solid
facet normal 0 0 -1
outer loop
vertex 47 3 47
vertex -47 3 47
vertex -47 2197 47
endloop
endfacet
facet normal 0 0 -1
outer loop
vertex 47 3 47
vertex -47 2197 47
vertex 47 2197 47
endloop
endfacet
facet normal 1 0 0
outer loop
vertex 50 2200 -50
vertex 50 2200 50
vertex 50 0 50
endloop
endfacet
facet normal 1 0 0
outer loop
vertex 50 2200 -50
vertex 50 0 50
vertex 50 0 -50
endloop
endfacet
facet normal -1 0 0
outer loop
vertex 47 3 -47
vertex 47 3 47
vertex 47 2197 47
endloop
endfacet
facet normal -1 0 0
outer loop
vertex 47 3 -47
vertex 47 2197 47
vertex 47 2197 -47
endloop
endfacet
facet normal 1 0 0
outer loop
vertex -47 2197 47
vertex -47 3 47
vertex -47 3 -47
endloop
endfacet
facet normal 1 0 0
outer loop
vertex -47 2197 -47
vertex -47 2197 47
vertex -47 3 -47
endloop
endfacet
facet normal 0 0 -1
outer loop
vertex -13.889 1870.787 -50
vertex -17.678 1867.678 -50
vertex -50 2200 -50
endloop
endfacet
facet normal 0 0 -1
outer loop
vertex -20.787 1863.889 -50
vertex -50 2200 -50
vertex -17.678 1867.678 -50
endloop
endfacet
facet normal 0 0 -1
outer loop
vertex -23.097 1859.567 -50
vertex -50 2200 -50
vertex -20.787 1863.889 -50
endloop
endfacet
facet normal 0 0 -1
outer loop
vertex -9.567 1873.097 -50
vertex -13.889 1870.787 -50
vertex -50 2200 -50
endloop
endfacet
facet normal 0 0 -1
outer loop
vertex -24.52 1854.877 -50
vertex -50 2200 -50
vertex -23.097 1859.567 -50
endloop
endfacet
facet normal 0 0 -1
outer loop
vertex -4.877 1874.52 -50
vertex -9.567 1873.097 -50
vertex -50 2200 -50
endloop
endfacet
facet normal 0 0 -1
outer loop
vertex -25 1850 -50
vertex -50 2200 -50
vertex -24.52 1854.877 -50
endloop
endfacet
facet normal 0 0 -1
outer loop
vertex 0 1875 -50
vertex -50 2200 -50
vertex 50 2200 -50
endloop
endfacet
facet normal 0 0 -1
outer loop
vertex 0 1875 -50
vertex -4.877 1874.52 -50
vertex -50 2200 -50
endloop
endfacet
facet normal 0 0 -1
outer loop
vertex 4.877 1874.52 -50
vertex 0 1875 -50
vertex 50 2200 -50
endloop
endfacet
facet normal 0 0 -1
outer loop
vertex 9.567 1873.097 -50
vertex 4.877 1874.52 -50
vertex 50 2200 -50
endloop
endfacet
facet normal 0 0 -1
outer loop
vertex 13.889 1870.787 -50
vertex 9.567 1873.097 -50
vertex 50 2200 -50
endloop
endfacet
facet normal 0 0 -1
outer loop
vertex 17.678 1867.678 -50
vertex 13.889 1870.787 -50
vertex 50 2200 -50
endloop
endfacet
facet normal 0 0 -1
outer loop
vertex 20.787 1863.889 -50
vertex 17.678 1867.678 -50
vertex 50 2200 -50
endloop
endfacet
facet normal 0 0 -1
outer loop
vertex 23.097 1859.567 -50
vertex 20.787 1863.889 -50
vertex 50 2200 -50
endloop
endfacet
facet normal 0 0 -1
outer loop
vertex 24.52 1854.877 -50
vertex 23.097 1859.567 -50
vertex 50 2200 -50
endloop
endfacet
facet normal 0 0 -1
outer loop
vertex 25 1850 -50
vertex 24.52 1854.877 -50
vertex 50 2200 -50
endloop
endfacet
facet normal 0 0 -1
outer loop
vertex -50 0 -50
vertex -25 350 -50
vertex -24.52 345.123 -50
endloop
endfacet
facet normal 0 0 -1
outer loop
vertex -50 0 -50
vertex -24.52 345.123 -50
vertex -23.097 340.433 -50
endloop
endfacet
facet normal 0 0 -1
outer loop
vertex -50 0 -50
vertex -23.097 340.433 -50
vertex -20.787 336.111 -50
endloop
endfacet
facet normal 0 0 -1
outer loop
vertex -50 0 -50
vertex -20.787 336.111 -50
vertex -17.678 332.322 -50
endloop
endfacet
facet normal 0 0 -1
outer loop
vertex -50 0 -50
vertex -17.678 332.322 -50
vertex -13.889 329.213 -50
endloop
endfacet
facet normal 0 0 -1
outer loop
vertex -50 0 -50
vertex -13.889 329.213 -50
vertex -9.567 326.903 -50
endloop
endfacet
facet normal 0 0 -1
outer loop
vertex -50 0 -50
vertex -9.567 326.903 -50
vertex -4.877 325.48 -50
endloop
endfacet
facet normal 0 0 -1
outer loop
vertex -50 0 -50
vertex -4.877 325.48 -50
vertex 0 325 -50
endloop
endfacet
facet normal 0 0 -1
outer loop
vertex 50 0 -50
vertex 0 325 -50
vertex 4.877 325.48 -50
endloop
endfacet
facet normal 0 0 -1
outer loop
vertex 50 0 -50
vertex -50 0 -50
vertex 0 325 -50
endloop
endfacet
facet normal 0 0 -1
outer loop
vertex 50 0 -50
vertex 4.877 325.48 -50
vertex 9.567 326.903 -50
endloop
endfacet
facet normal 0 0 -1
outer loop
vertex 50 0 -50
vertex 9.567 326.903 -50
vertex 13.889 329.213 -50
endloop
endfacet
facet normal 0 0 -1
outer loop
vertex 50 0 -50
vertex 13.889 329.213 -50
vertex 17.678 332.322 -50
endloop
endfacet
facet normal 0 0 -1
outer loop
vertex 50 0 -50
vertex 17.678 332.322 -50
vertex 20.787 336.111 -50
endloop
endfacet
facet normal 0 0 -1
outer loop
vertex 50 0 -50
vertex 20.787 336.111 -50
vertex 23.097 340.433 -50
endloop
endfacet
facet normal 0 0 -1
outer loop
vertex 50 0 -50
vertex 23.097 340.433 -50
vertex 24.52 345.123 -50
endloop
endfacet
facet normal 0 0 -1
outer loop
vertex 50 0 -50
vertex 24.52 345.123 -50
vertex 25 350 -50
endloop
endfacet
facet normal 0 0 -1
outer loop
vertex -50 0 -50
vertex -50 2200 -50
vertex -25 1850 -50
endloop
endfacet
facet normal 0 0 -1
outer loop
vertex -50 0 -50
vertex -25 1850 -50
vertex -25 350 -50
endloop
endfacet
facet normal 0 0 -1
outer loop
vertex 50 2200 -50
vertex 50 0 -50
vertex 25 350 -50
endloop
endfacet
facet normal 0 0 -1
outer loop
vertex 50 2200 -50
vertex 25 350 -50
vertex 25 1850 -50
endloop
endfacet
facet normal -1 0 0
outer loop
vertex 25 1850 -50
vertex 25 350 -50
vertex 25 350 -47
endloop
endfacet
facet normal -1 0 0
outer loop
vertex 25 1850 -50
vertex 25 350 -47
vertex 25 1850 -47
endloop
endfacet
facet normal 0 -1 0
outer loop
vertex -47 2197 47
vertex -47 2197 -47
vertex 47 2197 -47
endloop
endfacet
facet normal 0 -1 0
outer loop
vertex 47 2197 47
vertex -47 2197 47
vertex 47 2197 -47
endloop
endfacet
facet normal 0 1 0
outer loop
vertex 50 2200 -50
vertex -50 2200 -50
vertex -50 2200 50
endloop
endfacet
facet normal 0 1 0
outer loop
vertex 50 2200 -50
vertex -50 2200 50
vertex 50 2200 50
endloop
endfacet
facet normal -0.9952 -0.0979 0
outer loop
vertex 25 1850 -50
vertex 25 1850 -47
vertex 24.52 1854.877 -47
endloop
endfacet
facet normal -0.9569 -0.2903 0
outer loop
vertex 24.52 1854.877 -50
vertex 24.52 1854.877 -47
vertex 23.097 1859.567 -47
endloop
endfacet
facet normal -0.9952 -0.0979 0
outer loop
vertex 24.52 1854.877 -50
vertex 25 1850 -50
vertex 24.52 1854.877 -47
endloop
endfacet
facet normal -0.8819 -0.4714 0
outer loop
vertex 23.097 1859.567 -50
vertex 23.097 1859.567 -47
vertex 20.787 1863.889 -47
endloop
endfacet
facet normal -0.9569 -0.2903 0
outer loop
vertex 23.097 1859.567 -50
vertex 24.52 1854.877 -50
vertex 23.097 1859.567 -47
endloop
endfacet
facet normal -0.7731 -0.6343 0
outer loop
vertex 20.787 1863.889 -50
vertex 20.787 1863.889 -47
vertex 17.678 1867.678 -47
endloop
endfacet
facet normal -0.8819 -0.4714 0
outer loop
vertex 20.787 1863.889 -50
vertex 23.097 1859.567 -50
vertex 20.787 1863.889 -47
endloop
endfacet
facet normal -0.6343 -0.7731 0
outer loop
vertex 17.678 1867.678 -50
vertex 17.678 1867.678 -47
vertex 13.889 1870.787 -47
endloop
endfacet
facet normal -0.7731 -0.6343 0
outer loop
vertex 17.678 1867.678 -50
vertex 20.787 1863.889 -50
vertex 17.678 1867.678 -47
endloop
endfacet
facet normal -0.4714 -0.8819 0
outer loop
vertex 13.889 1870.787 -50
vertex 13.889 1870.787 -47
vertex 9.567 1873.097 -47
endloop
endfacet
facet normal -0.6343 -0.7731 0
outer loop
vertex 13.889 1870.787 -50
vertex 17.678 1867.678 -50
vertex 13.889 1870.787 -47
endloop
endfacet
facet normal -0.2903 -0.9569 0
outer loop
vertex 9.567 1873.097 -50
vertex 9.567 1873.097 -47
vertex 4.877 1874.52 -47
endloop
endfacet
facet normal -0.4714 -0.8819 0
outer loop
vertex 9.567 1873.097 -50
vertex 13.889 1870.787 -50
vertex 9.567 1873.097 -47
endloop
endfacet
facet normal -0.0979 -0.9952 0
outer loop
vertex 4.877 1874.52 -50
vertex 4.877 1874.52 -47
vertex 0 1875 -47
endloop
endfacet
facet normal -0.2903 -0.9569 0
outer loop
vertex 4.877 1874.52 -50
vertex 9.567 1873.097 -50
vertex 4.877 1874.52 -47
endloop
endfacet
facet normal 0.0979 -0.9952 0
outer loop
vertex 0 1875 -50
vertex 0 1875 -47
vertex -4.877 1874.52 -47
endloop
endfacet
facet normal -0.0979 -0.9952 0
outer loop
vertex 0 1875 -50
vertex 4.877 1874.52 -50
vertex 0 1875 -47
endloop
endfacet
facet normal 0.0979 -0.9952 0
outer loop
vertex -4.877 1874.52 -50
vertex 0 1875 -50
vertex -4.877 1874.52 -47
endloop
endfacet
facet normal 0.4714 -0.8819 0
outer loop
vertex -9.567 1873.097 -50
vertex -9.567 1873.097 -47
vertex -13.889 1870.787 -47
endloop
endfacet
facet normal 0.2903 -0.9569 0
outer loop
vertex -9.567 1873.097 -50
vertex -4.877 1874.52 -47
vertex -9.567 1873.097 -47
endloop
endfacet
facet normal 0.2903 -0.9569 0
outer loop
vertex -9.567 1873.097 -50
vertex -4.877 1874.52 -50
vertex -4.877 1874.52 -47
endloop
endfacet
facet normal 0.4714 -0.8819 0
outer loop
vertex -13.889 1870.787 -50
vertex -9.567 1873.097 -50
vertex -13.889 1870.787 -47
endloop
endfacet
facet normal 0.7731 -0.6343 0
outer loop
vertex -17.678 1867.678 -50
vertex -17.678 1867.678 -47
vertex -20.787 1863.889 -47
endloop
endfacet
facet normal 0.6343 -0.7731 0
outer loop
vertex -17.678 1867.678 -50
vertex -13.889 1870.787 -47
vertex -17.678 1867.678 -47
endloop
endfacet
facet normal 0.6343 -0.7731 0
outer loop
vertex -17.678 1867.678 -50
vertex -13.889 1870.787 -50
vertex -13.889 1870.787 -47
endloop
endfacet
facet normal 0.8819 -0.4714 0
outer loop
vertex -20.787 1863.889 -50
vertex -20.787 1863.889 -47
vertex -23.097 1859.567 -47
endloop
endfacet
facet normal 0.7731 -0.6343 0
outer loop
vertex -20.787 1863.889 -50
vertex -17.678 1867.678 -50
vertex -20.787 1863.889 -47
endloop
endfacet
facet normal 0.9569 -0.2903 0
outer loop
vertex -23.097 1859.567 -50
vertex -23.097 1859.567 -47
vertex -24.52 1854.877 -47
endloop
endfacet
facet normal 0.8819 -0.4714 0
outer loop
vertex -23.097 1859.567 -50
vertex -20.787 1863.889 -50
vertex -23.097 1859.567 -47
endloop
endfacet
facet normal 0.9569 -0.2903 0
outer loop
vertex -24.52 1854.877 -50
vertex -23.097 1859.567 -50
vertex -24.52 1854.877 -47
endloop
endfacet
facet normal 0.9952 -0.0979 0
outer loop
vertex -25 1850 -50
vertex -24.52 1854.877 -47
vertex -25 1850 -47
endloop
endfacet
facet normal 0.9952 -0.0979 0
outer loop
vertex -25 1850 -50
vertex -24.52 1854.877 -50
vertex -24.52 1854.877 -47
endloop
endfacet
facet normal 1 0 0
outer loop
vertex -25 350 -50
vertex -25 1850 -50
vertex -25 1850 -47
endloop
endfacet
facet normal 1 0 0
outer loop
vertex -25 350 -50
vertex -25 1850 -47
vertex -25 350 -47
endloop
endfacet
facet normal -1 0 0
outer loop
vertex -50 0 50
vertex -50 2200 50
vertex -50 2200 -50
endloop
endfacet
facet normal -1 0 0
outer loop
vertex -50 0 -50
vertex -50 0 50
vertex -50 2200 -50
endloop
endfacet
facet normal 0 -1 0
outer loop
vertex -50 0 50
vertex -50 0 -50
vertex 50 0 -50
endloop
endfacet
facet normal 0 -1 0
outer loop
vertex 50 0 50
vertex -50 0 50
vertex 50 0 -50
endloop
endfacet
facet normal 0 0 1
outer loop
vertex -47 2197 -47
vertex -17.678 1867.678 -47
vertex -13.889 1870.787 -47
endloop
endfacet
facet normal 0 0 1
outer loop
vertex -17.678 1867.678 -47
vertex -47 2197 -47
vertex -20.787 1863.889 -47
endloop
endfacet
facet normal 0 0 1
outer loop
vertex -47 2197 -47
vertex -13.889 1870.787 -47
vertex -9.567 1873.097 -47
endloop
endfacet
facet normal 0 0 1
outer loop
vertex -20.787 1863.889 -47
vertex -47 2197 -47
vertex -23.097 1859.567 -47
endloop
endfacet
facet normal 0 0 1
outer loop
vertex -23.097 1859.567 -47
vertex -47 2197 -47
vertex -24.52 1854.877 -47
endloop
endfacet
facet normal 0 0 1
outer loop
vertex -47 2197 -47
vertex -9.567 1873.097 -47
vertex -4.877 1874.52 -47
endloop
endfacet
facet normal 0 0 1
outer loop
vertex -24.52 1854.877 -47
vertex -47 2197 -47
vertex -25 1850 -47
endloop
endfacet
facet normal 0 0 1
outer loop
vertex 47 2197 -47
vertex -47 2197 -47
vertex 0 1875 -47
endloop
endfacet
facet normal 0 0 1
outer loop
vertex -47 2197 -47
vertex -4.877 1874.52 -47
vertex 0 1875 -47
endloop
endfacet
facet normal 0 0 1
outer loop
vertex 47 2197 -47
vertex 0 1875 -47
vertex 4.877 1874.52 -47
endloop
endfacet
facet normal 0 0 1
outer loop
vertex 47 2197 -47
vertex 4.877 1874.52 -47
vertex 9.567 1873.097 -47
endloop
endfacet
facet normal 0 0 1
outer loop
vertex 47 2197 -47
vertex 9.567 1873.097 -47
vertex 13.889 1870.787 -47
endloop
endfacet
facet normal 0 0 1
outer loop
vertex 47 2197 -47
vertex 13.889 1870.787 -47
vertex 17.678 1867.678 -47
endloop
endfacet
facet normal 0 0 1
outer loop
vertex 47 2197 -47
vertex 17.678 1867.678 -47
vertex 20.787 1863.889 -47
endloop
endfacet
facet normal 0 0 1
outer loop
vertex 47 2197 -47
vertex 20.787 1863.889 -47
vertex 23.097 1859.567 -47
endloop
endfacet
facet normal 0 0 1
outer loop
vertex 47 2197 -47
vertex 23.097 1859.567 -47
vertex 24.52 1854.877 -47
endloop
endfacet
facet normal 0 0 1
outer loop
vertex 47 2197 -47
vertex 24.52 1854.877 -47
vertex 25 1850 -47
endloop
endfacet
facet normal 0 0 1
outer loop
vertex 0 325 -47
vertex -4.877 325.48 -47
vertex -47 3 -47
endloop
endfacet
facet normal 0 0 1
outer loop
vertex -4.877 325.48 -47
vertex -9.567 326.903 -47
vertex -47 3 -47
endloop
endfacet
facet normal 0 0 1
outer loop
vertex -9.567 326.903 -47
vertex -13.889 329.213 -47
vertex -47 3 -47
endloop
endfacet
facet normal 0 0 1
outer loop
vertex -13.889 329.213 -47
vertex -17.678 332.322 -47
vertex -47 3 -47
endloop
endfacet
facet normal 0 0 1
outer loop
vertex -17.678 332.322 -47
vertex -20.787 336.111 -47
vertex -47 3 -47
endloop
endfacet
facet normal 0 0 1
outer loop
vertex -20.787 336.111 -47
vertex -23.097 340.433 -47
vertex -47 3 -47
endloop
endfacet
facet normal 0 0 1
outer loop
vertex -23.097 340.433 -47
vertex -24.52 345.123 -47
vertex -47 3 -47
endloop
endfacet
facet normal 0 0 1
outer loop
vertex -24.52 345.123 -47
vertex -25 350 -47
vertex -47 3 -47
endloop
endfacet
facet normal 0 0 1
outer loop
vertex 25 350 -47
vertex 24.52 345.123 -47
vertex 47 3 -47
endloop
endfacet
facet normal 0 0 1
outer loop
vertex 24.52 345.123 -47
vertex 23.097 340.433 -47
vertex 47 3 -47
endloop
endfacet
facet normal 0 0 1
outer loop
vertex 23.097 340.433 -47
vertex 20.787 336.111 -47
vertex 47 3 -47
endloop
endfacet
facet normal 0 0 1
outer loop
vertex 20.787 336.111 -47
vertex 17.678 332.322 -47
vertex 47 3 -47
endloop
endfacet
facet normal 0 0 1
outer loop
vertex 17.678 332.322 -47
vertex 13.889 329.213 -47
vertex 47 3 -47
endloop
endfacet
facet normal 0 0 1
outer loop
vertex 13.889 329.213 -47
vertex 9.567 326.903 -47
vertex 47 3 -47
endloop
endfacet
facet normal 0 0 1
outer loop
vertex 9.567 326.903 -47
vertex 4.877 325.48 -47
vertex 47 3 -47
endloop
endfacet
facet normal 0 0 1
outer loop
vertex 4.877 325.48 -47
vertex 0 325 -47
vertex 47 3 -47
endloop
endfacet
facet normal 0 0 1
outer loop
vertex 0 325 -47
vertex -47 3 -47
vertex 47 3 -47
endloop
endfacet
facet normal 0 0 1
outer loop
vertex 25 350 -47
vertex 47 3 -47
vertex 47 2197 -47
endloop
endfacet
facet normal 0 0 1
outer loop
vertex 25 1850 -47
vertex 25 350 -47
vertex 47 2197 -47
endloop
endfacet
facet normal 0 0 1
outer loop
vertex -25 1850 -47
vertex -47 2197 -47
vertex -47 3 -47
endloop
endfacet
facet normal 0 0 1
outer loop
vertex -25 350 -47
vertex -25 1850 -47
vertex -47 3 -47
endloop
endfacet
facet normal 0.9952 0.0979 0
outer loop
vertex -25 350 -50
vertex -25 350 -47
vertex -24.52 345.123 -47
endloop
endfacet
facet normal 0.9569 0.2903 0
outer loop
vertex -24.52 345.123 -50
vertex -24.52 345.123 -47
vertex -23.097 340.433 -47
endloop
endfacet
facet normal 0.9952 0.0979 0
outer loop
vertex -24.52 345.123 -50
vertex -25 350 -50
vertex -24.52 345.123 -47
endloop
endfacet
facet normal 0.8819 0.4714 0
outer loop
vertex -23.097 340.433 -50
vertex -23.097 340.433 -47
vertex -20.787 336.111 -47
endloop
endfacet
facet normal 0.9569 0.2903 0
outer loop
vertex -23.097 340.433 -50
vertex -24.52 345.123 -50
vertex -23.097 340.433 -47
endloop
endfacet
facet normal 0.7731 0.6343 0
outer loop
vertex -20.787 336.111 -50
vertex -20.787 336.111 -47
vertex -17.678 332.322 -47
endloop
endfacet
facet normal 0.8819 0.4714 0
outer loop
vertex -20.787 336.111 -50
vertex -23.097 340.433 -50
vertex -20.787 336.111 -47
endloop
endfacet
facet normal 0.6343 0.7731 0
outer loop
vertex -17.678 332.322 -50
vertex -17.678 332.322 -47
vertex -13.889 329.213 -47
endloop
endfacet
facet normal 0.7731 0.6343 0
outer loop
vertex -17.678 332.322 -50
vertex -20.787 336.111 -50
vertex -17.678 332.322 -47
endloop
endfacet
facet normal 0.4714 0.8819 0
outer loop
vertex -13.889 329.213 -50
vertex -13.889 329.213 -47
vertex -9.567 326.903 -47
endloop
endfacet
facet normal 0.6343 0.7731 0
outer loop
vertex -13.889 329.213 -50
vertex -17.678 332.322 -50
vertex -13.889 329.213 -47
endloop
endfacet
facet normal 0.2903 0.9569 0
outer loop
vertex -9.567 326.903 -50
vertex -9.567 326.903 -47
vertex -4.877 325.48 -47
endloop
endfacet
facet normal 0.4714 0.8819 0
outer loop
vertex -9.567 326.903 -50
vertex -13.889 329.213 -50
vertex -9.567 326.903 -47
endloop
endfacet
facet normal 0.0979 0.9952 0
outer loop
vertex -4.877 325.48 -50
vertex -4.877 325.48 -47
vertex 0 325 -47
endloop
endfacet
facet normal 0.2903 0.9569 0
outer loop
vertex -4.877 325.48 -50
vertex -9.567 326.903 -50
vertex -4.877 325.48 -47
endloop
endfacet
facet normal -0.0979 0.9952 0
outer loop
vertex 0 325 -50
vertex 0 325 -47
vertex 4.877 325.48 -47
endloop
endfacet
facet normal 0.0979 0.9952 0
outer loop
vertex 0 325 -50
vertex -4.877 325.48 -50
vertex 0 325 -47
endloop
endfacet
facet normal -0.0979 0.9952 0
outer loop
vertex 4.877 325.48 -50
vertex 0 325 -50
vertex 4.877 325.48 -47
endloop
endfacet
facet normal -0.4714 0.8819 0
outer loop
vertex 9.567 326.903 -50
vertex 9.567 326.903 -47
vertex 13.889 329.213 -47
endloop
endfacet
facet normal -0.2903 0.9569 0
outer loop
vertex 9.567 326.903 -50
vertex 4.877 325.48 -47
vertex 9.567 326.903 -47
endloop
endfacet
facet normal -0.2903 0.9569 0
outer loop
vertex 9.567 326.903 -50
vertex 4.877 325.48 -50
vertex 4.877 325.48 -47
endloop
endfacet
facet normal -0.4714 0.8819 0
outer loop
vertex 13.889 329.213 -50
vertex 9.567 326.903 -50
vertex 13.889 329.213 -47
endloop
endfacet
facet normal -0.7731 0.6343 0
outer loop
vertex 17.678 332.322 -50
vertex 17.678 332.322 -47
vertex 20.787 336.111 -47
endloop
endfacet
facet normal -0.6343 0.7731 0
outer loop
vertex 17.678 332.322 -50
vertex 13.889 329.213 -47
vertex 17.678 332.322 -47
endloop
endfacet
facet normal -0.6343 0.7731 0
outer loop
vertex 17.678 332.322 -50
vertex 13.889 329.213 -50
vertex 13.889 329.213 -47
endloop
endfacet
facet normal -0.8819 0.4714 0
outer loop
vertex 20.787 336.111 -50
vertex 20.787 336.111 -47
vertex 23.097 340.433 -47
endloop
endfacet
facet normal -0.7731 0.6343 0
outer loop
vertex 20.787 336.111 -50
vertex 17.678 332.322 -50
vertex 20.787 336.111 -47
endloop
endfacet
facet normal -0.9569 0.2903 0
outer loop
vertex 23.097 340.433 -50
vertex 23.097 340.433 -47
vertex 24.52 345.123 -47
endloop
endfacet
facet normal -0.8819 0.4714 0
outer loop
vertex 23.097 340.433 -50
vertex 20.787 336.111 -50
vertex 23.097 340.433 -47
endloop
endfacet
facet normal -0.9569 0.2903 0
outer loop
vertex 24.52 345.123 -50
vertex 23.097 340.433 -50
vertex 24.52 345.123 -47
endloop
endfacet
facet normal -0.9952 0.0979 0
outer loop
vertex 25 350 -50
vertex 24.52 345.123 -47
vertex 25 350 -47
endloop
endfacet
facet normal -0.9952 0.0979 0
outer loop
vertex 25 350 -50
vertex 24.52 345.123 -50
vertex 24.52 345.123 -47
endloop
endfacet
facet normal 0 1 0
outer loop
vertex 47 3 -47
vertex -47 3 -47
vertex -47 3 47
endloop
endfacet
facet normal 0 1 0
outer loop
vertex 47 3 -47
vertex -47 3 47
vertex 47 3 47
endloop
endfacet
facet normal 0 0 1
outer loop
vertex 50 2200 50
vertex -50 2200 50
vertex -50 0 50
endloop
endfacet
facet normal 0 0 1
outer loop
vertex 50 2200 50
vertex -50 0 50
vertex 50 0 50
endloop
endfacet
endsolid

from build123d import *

# Parameters (mm, degrees)
SKETCH1_W           = 100
SKETCH1_H           = 100
BOSS_EXTRUDE1_DEPTH = 2200
SHELL1_T            = 3
CUT_EXTRUDE2_DEPTH  = 10


with BuildPart() as part:
    # Sketch1 → Boss-Extrude1 (new body)
    with BuildSketch(Plane(origin=(0, 0, 0), x_dir=(1, 0, 0), z_dir=(0, 1, 0))):
        Rectangle(SKETCH1_W, SKETCH1_H)
    extrude(amount=BOSS_EXTRUDE1_DEPTH)

    # Shell1 (no face opened: a closed hollow body)
    add(offset(amount=-SHELL1_T, mode=Mode.PRIVATE), mode=Mode.SUBTRACT)

    # Sketch3 → Cut-Extrude2 (cut)
    with BuildSketch(Plane(origin=(0, 0, -50), x_dir=(-1, 0, 0), z_dir=(0, 0, -1))):
        with BuildLine():
            Line((-25, 350), (-25, 1850))
            ThreePointArc((-25, 1850), (0, 1875), (25, 1850))
            Line((25, 1850), (25, 350))
            ThreePointArc((25, 350), (0, 325), (-25, 350))
        make_face()
    extrude(amount=-CUT_EXTRUDE2_DEPTH, mode=Mode.SUBTRACT)


solid = part.part
